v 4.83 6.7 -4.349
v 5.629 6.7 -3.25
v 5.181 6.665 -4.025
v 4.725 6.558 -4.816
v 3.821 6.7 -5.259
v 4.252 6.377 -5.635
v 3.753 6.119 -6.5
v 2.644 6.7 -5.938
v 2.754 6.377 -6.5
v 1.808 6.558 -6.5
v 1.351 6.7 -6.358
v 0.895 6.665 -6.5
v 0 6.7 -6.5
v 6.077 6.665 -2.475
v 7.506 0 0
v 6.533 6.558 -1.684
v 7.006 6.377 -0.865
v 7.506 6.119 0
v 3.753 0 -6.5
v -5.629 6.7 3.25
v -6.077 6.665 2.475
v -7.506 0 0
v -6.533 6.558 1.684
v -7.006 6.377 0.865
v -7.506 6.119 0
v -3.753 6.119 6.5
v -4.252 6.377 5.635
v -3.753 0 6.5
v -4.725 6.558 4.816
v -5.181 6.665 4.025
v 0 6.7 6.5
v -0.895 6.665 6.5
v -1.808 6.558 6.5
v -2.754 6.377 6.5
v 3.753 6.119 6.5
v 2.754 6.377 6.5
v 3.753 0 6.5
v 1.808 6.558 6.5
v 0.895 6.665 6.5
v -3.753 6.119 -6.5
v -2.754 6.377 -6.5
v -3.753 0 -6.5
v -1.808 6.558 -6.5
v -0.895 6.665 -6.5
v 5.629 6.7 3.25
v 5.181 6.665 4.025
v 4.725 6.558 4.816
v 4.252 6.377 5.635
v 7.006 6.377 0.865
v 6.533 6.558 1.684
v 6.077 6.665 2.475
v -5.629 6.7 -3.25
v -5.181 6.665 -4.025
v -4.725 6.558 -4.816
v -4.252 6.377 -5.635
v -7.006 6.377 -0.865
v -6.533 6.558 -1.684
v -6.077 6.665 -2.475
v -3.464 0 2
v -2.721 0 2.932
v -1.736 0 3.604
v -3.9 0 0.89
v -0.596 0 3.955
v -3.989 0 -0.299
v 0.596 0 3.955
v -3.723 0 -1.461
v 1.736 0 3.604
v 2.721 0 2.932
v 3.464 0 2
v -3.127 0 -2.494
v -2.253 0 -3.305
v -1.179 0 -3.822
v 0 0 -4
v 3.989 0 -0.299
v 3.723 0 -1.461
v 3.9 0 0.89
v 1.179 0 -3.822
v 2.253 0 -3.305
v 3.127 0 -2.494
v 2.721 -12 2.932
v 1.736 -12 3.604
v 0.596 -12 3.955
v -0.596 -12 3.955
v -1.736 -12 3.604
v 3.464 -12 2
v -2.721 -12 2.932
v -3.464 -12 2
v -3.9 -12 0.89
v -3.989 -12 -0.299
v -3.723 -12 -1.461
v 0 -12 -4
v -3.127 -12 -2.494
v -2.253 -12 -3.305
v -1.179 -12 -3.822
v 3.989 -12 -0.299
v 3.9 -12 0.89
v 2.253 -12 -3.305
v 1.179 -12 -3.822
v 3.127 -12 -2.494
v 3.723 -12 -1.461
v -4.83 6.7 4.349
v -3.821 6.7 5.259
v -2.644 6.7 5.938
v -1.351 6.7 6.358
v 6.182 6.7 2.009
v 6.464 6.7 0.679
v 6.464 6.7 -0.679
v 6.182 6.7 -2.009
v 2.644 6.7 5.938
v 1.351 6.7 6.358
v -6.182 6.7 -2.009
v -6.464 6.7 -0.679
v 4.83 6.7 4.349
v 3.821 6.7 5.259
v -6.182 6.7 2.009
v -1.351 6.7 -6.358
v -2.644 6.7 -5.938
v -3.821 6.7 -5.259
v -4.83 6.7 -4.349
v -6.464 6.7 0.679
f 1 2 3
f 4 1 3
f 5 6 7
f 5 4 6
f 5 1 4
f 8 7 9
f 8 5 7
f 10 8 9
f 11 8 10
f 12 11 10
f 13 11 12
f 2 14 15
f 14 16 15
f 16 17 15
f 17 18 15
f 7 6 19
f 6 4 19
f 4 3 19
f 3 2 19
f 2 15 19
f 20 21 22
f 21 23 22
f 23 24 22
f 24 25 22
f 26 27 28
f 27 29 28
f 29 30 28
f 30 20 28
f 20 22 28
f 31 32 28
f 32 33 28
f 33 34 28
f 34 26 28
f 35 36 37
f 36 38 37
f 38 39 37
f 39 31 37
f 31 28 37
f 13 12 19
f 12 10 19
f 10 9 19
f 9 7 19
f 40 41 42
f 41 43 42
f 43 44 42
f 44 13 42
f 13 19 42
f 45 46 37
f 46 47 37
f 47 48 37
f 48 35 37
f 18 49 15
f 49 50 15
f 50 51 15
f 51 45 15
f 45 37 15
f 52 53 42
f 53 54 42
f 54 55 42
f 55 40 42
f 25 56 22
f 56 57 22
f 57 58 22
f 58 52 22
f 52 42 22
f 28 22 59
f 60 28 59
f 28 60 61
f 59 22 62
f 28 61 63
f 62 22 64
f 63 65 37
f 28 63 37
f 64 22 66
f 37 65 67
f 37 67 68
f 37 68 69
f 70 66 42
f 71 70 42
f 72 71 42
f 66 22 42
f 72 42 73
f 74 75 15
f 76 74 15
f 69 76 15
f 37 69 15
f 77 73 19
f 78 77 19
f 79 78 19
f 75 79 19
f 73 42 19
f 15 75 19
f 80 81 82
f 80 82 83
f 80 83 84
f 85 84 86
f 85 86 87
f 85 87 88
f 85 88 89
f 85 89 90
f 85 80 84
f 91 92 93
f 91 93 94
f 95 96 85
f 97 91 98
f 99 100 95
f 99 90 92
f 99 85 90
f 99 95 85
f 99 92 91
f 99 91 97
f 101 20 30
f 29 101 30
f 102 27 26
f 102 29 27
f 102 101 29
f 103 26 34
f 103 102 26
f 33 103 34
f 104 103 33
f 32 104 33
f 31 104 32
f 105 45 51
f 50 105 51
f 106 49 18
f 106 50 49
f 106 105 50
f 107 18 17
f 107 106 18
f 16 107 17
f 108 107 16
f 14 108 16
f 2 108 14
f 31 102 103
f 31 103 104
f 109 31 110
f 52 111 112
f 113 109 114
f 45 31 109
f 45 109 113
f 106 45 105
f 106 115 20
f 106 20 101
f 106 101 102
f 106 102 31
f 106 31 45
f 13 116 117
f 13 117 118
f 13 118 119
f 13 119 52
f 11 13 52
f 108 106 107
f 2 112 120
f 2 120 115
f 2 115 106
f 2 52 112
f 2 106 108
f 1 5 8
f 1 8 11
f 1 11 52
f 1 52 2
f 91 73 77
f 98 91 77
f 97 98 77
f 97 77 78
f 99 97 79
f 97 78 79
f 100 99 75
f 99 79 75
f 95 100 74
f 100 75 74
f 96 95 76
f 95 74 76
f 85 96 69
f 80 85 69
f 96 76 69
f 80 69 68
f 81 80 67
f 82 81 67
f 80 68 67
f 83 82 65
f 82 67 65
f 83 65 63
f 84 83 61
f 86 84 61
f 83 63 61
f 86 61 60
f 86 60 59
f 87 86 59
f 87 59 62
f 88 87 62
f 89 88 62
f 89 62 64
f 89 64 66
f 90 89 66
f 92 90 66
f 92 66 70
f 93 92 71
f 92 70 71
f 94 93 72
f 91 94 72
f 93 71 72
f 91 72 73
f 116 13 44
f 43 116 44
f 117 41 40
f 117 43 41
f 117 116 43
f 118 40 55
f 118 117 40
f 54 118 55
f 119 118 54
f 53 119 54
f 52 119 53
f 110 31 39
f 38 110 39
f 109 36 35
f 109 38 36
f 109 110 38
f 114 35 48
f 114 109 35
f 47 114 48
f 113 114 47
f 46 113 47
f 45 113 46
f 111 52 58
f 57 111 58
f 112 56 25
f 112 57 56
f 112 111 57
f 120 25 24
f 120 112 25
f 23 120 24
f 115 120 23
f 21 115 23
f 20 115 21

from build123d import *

# Parameters (mm, degrees)
BOSS_EXTRUDE1_DEPTH = 6.7
SKETCH2_R           = 4
BOSS_EXTRUDE2_DEPTH = 12
SKETCH3_OUTSIDE_W   = 57.108
SKETCH3_OUTSIDE_H   = 55.096
SKETCH3_OUTSIDE_R   = 6.5
CUT_EXTRUDE3_DEPTH  = 10
CUT_EXTRUDE3_DRAFT  = -60


with BuildPart() as part:
    # Sketch1 → Boss-Extrude1 (new body)
    with BuildSketch(Plane(origin=(0, 0, 0), x_dir=(1, 0, 0), z_dir=(0, 1, 0))):
        Polygon((7.505553499, 0), (3.75277675, 6.5), (-3.75277675, 6.5), (-7.505553499, 0), (-3.75277675, -6.5), (3.75277675, -6.5), align=None)
    extrude(amount=BOSS_EXTRUDE1_DEPTH)

    # Sketch2 → Boss-Extrude2 (add)
    with BuildSketch(Plane.XZ):
        with Locations(Location((0, 0, 0), (0, 0, 270))):
            Circle(SKETCH2_R)
    extrude(amount=BOSS_EXTRUDE2_DEPTH)


with BuildPart() as cut_extrude3_tool:
    # Sketch3 outside → Cut-Extrude3 (with draft: the straight prism first)
    with BuildSketch(Plane(origin=(0, 6.7, 0), x_dir=(1, 0, 0), z_dir=(0, 1, 0))):
        Rectangle(SKETCH3_OUTSIDE_W, SKETCH3_OUTSIDE_H)
        Circle(SKETCH3_OUTSIDE_R, mode=Mode.SUBTRACT)
    extrude(amount=-CUT_EXTRUDE3_DEPTH)
    # Cut-Extrude3: the draft: its side faces are tilted about the plane it starts from
    cut_extrude3_sides = [cut_extrude3_tool.faces().sort_by_distance(p)[0] for p in [
        (0, 1.7, 27.548),
        (28.554, 1.7, 0),
        (0, 1.7, -27.548),
        (-28.554, 1.7, 0),
        (-6.5, 1.7, 0),
    ]]
    draft(cut_extrude3_sides, Plane(origin=(0, 6.7, 0), x_dir=(1, 0, 0), z_dir=(0, 1, 0)), CUT_EXTRUDE3_DRAFT)


with BuildPart() as part_1:
    add(part.part)

    # Cut-Extrude3: cut by cut_extrude3_tool
    add(cut_extrude3_tool.part, mode=Mode.SUBTRACT)


solid = part_1.part
